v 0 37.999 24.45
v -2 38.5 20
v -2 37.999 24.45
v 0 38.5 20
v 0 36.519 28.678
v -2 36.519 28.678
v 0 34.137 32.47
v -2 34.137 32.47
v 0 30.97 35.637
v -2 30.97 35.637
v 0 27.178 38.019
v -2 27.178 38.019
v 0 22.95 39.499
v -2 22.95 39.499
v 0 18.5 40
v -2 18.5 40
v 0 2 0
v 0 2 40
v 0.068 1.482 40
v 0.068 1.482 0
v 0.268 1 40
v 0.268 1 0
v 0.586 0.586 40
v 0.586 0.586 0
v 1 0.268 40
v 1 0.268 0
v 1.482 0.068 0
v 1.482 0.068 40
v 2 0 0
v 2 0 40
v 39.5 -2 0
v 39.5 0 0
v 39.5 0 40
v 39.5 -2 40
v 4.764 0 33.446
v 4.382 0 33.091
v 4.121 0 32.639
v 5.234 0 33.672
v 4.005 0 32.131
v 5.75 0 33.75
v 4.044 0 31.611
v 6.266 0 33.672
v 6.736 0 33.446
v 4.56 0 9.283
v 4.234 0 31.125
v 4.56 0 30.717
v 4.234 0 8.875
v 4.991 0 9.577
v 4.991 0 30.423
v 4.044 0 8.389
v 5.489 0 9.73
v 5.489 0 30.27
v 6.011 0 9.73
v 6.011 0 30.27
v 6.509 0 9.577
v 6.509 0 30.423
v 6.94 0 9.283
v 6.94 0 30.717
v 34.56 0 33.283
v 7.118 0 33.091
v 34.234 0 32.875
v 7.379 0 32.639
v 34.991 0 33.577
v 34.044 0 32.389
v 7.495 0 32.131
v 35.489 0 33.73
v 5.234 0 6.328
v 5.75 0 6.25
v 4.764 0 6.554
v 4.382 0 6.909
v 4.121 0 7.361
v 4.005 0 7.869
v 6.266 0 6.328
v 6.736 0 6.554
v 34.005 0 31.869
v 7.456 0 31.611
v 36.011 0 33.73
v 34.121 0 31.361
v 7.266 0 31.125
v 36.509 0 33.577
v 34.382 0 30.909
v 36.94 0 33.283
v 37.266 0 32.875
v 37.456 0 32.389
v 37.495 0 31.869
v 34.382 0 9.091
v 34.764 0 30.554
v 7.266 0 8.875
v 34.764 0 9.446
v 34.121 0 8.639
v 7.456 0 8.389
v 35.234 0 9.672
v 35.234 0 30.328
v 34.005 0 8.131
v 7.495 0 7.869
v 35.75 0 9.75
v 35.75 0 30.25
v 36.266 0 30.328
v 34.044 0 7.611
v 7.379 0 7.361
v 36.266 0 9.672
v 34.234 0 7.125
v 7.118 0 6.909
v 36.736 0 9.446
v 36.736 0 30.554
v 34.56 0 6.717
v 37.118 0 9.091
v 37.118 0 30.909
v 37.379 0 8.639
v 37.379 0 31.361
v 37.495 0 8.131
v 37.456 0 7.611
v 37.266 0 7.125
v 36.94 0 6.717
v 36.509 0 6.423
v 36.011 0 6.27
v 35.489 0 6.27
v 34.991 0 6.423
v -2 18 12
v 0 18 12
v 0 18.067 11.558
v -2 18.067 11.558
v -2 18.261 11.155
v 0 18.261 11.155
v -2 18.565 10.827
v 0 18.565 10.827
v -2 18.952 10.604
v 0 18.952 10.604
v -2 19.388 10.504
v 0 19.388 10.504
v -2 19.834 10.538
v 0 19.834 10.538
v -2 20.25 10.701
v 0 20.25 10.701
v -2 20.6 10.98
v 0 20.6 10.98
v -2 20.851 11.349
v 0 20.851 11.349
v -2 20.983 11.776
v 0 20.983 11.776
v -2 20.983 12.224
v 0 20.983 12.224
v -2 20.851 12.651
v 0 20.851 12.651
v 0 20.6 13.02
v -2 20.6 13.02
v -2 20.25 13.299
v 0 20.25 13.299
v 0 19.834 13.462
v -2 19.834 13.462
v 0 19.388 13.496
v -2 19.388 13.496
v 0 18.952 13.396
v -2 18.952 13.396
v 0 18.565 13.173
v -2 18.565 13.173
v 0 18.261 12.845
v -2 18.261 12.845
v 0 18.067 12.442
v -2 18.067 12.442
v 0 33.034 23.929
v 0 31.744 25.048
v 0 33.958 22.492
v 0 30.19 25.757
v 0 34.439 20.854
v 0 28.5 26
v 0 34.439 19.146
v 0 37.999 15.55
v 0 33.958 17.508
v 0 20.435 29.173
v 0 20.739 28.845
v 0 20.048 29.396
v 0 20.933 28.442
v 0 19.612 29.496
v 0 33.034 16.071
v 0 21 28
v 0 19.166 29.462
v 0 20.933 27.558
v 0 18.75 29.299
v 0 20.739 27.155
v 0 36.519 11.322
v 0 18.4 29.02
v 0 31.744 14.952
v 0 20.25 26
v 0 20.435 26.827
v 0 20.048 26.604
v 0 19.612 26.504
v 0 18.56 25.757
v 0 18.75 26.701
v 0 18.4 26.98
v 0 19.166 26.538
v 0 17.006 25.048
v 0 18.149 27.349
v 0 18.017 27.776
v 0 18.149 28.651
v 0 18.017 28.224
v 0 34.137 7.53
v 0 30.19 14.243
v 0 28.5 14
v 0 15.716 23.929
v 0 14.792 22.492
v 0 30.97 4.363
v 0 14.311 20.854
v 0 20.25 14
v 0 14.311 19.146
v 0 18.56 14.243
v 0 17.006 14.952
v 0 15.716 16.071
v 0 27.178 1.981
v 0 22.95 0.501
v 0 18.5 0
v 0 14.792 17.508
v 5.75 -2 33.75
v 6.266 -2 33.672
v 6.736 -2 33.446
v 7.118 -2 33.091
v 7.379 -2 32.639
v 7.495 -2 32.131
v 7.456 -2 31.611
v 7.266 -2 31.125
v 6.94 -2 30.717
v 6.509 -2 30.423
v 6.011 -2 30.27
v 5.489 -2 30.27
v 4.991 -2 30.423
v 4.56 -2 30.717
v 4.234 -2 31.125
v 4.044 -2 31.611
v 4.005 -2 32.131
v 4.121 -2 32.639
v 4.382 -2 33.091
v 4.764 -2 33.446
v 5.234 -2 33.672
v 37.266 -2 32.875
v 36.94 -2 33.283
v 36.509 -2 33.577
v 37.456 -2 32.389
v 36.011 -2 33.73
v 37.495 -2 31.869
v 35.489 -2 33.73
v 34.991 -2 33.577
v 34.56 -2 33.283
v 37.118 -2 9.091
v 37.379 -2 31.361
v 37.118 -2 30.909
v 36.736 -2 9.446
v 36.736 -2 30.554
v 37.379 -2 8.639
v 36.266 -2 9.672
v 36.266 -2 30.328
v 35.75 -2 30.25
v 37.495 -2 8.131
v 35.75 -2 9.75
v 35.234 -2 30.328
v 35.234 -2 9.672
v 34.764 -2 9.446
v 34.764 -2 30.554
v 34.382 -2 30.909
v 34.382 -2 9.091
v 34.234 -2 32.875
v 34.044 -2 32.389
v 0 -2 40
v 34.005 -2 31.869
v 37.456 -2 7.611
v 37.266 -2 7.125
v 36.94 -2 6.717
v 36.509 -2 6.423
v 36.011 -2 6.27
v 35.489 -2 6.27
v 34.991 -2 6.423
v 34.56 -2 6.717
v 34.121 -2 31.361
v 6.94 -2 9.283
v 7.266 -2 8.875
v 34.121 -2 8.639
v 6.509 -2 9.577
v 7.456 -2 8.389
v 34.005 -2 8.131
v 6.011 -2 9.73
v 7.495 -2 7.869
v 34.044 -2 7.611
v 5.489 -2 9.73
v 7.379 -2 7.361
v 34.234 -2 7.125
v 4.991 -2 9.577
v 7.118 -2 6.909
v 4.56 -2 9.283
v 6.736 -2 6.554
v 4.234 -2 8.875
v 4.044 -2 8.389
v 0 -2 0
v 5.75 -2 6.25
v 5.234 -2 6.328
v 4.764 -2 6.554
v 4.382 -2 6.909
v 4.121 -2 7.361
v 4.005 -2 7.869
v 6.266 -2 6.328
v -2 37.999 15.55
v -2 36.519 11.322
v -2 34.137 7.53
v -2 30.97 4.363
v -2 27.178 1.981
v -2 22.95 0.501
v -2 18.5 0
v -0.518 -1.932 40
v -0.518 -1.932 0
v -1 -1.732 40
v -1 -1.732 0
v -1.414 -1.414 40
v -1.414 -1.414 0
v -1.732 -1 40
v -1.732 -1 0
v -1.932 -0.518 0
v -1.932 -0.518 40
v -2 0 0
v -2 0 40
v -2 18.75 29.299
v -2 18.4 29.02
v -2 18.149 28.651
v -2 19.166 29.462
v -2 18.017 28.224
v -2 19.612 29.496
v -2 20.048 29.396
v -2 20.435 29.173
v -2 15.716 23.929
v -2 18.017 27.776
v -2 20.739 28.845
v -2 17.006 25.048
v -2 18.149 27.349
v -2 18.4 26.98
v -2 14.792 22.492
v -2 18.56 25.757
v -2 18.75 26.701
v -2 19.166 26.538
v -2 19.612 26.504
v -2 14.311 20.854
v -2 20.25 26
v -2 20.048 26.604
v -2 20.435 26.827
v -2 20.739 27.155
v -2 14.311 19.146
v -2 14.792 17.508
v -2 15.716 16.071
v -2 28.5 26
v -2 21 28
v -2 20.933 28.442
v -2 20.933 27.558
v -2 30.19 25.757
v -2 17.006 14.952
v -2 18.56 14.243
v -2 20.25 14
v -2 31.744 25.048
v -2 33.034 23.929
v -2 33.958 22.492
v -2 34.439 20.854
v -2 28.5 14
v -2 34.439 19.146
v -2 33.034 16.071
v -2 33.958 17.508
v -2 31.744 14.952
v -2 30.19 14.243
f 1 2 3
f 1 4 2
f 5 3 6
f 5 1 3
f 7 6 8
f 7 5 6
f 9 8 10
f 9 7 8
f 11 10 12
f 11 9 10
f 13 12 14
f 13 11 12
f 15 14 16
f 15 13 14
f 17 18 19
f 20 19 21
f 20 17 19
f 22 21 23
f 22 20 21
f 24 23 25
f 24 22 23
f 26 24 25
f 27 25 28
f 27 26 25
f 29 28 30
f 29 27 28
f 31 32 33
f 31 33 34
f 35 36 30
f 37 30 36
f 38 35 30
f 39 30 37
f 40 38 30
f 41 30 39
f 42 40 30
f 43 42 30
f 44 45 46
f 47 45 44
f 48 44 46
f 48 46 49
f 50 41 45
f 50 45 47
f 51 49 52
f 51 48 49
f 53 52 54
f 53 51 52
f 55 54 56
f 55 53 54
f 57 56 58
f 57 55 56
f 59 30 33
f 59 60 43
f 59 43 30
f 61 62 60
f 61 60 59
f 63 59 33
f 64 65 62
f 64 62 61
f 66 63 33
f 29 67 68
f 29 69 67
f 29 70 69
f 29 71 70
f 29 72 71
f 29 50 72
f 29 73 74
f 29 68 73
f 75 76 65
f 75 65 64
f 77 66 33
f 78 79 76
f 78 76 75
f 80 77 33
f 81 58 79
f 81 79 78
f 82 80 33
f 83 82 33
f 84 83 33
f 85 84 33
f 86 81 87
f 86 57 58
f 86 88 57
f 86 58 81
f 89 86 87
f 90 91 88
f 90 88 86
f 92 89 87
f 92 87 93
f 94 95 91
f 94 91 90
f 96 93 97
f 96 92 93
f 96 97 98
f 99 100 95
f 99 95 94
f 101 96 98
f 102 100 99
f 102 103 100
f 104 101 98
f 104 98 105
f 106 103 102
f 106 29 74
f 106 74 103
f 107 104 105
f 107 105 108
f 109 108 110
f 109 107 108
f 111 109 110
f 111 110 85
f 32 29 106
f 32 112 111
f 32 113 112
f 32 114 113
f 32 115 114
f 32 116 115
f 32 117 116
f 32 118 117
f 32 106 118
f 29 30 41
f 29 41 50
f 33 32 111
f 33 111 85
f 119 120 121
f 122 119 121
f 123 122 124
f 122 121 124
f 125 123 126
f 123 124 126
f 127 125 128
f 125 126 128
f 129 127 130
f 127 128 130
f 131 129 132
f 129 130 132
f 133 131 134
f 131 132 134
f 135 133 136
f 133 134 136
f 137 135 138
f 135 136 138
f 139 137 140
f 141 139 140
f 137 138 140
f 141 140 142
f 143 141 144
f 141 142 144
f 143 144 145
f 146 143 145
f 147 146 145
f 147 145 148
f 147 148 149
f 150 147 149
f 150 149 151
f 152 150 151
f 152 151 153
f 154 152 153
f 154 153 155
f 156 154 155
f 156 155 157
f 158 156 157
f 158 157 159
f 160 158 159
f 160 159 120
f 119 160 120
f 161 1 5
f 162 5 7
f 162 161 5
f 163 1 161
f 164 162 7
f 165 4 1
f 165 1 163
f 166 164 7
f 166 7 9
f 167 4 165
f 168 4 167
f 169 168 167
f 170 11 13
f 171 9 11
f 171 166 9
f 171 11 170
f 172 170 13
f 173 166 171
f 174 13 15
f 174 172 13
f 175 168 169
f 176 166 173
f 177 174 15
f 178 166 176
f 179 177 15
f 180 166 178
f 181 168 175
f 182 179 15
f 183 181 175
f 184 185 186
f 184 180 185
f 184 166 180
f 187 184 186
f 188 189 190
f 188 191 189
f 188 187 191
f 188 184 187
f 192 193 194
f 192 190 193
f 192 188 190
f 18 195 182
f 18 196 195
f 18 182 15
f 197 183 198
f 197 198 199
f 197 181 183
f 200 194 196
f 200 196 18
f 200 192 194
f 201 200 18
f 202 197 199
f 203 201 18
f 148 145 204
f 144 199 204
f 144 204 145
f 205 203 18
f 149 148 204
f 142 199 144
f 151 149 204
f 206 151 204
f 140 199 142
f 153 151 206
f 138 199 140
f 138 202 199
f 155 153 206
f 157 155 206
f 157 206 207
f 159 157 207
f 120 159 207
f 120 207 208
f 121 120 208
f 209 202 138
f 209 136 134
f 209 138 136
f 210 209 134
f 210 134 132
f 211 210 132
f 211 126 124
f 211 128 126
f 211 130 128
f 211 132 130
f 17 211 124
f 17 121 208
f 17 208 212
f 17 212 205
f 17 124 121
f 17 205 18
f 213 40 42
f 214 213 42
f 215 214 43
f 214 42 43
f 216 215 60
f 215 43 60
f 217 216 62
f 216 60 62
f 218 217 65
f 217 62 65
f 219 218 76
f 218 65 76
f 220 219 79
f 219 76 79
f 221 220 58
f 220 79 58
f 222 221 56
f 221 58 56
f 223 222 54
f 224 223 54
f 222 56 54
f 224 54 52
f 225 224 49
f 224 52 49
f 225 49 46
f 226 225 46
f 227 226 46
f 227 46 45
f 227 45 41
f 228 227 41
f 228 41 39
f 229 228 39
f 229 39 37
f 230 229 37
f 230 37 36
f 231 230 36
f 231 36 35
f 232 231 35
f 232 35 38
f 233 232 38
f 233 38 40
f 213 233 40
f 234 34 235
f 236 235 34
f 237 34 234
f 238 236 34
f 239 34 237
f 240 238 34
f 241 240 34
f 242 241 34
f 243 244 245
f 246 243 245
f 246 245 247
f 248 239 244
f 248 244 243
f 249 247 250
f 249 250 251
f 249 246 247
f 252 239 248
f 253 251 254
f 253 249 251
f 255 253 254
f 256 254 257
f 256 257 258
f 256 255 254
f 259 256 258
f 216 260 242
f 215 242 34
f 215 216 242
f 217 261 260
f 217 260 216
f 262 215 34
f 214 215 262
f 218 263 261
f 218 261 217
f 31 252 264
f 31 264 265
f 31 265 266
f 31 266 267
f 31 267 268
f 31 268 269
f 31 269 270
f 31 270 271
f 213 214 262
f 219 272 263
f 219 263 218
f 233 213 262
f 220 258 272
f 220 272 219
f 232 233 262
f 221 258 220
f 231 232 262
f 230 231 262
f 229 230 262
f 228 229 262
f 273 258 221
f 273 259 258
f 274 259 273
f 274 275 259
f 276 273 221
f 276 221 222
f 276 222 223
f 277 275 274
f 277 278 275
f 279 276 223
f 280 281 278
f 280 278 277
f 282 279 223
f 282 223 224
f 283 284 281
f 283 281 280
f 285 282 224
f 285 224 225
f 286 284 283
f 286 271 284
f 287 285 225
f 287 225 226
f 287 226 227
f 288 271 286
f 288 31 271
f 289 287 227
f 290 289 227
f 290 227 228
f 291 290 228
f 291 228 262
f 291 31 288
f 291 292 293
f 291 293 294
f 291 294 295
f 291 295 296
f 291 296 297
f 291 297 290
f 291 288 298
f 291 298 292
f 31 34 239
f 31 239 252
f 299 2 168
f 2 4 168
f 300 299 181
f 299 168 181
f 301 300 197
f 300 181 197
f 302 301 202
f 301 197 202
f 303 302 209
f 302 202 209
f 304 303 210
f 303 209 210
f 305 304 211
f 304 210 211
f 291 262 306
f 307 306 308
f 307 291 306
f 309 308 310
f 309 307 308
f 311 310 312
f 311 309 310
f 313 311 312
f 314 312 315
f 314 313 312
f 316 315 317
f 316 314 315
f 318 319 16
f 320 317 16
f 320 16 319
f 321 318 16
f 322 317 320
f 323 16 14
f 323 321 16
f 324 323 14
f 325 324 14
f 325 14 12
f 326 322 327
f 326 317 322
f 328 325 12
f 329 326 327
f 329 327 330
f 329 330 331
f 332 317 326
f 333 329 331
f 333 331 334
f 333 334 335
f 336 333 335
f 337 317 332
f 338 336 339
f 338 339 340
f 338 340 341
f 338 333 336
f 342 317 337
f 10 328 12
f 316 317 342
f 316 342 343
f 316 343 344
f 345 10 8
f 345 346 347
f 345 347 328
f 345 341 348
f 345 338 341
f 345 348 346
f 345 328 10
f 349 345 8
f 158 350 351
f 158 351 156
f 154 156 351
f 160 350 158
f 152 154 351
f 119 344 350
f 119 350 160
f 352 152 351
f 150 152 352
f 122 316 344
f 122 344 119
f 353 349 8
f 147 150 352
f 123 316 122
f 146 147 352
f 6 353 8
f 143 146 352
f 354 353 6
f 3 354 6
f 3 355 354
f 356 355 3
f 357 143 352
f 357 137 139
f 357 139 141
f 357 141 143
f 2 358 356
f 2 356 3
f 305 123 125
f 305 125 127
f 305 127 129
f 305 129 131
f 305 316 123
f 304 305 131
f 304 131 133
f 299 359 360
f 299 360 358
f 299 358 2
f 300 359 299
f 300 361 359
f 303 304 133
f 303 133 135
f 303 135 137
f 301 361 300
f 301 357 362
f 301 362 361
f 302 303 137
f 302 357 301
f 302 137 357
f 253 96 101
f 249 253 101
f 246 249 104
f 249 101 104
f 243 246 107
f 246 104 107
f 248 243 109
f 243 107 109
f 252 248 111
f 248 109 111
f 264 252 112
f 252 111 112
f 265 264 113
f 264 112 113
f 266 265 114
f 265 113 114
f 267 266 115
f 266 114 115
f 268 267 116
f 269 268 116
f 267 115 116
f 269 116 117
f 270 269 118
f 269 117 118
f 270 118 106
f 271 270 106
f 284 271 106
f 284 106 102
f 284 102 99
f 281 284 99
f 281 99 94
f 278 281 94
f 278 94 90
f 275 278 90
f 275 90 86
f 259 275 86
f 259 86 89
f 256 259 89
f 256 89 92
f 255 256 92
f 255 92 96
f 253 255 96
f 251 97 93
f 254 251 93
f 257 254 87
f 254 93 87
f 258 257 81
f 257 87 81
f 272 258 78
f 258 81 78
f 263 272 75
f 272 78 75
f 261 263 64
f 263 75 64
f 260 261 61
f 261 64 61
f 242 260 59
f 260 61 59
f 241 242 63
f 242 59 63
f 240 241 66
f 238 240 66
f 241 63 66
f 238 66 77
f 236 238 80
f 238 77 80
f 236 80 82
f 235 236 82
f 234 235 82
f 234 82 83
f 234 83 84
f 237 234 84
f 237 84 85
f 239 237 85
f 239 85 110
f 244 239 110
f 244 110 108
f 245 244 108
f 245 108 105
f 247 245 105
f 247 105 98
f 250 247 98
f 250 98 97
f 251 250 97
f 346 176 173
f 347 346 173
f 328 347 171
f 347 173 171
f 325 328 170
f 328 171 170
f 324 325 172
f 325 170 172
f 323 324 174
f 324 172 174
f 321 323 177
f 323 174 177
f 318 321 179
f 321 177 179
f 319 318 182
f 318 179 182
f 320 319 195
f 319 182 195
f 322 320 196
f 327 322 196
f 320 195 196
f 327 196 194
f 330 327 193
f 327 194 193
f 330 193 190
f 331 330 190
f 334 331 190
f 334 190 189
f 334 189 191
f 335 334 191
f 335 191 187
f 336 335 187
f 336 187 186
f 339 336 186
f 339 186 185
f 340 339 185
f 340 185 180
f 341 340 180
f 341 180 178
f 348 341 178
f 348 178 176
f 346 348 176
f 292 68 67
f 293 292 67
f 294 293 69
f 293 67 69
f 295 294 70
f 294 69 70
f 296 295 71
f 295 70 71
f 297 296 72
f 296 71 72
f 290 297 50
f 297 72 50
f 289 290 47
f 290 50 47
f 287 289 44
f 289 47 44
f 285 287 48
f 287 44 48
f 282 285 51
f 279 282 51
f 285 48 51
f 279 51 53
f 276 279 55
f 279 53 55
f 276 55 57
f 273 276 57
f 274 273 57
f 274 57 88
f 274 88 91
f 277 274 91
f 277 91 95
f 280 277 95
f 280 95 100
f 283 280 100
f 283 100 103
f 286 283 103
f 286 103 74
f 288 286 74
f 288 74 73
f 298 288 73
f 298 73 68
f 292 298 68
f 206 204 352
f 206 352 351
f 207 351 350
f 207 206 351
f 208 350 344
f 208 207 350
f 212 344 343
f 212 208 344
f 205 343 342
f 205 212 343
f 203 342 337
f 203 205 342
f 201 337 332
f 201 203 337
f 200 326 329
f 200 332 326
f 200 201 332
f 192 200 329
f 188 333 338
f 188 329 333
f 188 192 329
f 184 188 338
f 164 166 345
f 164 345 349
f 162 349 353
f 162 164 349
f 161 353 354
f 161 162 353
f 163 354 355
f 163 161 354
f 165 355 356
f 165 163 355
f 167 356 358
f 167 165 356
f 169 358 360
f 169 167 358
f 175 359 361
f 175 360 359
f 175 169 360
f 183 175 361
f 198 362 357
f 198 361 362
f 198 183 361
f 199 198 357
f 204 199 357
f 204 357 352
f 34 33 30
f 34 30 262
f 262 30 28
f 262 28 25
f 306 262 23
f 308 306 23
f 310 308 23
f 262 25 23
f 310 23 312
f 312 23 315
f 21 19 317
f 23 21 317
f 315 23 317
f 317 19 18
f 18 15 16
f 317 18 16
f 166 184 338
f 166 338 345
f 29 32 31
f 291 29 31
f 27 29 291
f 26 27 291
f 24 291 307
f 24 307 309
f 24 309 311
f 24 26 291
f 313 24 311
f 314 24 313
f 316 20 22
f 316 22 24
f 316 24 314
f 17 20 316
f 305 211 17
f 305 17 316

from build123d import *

# Parameters (mm, degrees)
EXTRUDE_1_DEPTH     = 40
SKETCH_2_R          = 1.75
CUT_EXTRUDE_1_DEPTH = 69.135893624
CUT_EXTRUDE_2_DEPTH = 69.135893624
FILLET_1_R          = 20
FILLET_2_R          = 20
SKETCH_7_R          = 1.5
CUT_EXTRUDE_3_DEPTH = 69.135893624


with BuildPart() as part:
    # 草图1 → 凸台-拉伸1 (new body)
    with BuildSketch(Plane.XY):
        with BuildLine():
            Line((0, 38.5), (0, 2))
            ThreePointArc((0, 2), (0.585786438, 0.585786438), (2, 0))
            Line((2, 0), (39.5, 0))
            Line((39.5, 0), (39.5, -2))
            Line((39.5, -2), (0, -2))
            ThreePointArc((0, -2), (-1.414213562, -1.414213562), (-2, 0))
            Line((-2, 0), (-2, 38.5))
            Line((-2, 38.5), (0, 38.5))
        make_face()
    extrude(amount=EXTRUDE_1_DEPTH)

    # 草图2 → 切除-拉伸1 (cut, through all)
    with BuildSketch(Plane(origin=(0, 0, 0), x_dir=(1, 0, 0), z_dir=(0, 1, 0))):
        with Locations(Location((5.75, -32, 0), (0, 0, 270))):
            Circle(SKETCH_2_R)
        with Locations(Location((35.75, -32, 0), (0, 0, 90))):
            Circle(SKETCH_2_R)
        with Locations(Location((5.75, -8, 0), (0, 0, 90))):
            Circle(SKETCH_2_R)
        with Locations(Location((35.75, -8, 0), (0, 0, 270))):
            Circle(SKETCH_2_R)
    extrude(amount=-CUT_EXTRUDE_1_DEPTH, mode=Mode.SUBTRACT)

    # 草图3 → 切除-拉伸2 (cut, through all)
    with BuildSketch(Plane(origin=(0, 0, 0), x_dir=(0, 0, -1), z_dir=(1, 0, 0))):
        with BuildLine():
            Line((-14, 28.5), (-14, 20.25))
            ThreePointArc((-14, 20.25), (-20, 14.25), (-26, 20.25))
            Line((-26, 20.25), (-26, 28.5))
            ThreePointArc((-26, 28.5), (-20, 34.5), (-14, 28.5))
        make_face()
    extrude(amount=-CUT_EXTRUDE_2_DEPTH, mode=Mode.SUBTRACT)

    # 圆角1
    fillet_1_edges = [part.edges().sort_by_distance(p)[0] for p in [
        (-1, 38.5, 40),
    ]]
    fillet(fillet_1_edges, radius=FILLET_1_R)

    # 圆角2
    fillet_2_edges = [part.edges().sort_by_distance(p)[0] for p in [
        (-1, 38.5, 0),
    ]]
    fillet(fillet_2_edges, radius=FILLET_2_R - 0.0001)  # a hair under: the kernel refuses the full size

    # 草图7 → 切除-拉伸3 (cut, through all)
    with BuildSketch(Plane(origin=(0, 0, 0), x_dir=(0, 0, -1), z_dir=(1, 0, 0))):
        with Locations(Location((-28, 19.5, 0), (0, 0, 90))):
            Circle(SKETCH_7_R)
        with Locations(Location((-12, 19.5, 0), (0, 0, 270))):
            Circle(SKETCH_7_R)
    extrude(amount=-CUT_EXTRUDE_3_DEPTH, mode=Mode.SUBTRACT)


solid = part.part
